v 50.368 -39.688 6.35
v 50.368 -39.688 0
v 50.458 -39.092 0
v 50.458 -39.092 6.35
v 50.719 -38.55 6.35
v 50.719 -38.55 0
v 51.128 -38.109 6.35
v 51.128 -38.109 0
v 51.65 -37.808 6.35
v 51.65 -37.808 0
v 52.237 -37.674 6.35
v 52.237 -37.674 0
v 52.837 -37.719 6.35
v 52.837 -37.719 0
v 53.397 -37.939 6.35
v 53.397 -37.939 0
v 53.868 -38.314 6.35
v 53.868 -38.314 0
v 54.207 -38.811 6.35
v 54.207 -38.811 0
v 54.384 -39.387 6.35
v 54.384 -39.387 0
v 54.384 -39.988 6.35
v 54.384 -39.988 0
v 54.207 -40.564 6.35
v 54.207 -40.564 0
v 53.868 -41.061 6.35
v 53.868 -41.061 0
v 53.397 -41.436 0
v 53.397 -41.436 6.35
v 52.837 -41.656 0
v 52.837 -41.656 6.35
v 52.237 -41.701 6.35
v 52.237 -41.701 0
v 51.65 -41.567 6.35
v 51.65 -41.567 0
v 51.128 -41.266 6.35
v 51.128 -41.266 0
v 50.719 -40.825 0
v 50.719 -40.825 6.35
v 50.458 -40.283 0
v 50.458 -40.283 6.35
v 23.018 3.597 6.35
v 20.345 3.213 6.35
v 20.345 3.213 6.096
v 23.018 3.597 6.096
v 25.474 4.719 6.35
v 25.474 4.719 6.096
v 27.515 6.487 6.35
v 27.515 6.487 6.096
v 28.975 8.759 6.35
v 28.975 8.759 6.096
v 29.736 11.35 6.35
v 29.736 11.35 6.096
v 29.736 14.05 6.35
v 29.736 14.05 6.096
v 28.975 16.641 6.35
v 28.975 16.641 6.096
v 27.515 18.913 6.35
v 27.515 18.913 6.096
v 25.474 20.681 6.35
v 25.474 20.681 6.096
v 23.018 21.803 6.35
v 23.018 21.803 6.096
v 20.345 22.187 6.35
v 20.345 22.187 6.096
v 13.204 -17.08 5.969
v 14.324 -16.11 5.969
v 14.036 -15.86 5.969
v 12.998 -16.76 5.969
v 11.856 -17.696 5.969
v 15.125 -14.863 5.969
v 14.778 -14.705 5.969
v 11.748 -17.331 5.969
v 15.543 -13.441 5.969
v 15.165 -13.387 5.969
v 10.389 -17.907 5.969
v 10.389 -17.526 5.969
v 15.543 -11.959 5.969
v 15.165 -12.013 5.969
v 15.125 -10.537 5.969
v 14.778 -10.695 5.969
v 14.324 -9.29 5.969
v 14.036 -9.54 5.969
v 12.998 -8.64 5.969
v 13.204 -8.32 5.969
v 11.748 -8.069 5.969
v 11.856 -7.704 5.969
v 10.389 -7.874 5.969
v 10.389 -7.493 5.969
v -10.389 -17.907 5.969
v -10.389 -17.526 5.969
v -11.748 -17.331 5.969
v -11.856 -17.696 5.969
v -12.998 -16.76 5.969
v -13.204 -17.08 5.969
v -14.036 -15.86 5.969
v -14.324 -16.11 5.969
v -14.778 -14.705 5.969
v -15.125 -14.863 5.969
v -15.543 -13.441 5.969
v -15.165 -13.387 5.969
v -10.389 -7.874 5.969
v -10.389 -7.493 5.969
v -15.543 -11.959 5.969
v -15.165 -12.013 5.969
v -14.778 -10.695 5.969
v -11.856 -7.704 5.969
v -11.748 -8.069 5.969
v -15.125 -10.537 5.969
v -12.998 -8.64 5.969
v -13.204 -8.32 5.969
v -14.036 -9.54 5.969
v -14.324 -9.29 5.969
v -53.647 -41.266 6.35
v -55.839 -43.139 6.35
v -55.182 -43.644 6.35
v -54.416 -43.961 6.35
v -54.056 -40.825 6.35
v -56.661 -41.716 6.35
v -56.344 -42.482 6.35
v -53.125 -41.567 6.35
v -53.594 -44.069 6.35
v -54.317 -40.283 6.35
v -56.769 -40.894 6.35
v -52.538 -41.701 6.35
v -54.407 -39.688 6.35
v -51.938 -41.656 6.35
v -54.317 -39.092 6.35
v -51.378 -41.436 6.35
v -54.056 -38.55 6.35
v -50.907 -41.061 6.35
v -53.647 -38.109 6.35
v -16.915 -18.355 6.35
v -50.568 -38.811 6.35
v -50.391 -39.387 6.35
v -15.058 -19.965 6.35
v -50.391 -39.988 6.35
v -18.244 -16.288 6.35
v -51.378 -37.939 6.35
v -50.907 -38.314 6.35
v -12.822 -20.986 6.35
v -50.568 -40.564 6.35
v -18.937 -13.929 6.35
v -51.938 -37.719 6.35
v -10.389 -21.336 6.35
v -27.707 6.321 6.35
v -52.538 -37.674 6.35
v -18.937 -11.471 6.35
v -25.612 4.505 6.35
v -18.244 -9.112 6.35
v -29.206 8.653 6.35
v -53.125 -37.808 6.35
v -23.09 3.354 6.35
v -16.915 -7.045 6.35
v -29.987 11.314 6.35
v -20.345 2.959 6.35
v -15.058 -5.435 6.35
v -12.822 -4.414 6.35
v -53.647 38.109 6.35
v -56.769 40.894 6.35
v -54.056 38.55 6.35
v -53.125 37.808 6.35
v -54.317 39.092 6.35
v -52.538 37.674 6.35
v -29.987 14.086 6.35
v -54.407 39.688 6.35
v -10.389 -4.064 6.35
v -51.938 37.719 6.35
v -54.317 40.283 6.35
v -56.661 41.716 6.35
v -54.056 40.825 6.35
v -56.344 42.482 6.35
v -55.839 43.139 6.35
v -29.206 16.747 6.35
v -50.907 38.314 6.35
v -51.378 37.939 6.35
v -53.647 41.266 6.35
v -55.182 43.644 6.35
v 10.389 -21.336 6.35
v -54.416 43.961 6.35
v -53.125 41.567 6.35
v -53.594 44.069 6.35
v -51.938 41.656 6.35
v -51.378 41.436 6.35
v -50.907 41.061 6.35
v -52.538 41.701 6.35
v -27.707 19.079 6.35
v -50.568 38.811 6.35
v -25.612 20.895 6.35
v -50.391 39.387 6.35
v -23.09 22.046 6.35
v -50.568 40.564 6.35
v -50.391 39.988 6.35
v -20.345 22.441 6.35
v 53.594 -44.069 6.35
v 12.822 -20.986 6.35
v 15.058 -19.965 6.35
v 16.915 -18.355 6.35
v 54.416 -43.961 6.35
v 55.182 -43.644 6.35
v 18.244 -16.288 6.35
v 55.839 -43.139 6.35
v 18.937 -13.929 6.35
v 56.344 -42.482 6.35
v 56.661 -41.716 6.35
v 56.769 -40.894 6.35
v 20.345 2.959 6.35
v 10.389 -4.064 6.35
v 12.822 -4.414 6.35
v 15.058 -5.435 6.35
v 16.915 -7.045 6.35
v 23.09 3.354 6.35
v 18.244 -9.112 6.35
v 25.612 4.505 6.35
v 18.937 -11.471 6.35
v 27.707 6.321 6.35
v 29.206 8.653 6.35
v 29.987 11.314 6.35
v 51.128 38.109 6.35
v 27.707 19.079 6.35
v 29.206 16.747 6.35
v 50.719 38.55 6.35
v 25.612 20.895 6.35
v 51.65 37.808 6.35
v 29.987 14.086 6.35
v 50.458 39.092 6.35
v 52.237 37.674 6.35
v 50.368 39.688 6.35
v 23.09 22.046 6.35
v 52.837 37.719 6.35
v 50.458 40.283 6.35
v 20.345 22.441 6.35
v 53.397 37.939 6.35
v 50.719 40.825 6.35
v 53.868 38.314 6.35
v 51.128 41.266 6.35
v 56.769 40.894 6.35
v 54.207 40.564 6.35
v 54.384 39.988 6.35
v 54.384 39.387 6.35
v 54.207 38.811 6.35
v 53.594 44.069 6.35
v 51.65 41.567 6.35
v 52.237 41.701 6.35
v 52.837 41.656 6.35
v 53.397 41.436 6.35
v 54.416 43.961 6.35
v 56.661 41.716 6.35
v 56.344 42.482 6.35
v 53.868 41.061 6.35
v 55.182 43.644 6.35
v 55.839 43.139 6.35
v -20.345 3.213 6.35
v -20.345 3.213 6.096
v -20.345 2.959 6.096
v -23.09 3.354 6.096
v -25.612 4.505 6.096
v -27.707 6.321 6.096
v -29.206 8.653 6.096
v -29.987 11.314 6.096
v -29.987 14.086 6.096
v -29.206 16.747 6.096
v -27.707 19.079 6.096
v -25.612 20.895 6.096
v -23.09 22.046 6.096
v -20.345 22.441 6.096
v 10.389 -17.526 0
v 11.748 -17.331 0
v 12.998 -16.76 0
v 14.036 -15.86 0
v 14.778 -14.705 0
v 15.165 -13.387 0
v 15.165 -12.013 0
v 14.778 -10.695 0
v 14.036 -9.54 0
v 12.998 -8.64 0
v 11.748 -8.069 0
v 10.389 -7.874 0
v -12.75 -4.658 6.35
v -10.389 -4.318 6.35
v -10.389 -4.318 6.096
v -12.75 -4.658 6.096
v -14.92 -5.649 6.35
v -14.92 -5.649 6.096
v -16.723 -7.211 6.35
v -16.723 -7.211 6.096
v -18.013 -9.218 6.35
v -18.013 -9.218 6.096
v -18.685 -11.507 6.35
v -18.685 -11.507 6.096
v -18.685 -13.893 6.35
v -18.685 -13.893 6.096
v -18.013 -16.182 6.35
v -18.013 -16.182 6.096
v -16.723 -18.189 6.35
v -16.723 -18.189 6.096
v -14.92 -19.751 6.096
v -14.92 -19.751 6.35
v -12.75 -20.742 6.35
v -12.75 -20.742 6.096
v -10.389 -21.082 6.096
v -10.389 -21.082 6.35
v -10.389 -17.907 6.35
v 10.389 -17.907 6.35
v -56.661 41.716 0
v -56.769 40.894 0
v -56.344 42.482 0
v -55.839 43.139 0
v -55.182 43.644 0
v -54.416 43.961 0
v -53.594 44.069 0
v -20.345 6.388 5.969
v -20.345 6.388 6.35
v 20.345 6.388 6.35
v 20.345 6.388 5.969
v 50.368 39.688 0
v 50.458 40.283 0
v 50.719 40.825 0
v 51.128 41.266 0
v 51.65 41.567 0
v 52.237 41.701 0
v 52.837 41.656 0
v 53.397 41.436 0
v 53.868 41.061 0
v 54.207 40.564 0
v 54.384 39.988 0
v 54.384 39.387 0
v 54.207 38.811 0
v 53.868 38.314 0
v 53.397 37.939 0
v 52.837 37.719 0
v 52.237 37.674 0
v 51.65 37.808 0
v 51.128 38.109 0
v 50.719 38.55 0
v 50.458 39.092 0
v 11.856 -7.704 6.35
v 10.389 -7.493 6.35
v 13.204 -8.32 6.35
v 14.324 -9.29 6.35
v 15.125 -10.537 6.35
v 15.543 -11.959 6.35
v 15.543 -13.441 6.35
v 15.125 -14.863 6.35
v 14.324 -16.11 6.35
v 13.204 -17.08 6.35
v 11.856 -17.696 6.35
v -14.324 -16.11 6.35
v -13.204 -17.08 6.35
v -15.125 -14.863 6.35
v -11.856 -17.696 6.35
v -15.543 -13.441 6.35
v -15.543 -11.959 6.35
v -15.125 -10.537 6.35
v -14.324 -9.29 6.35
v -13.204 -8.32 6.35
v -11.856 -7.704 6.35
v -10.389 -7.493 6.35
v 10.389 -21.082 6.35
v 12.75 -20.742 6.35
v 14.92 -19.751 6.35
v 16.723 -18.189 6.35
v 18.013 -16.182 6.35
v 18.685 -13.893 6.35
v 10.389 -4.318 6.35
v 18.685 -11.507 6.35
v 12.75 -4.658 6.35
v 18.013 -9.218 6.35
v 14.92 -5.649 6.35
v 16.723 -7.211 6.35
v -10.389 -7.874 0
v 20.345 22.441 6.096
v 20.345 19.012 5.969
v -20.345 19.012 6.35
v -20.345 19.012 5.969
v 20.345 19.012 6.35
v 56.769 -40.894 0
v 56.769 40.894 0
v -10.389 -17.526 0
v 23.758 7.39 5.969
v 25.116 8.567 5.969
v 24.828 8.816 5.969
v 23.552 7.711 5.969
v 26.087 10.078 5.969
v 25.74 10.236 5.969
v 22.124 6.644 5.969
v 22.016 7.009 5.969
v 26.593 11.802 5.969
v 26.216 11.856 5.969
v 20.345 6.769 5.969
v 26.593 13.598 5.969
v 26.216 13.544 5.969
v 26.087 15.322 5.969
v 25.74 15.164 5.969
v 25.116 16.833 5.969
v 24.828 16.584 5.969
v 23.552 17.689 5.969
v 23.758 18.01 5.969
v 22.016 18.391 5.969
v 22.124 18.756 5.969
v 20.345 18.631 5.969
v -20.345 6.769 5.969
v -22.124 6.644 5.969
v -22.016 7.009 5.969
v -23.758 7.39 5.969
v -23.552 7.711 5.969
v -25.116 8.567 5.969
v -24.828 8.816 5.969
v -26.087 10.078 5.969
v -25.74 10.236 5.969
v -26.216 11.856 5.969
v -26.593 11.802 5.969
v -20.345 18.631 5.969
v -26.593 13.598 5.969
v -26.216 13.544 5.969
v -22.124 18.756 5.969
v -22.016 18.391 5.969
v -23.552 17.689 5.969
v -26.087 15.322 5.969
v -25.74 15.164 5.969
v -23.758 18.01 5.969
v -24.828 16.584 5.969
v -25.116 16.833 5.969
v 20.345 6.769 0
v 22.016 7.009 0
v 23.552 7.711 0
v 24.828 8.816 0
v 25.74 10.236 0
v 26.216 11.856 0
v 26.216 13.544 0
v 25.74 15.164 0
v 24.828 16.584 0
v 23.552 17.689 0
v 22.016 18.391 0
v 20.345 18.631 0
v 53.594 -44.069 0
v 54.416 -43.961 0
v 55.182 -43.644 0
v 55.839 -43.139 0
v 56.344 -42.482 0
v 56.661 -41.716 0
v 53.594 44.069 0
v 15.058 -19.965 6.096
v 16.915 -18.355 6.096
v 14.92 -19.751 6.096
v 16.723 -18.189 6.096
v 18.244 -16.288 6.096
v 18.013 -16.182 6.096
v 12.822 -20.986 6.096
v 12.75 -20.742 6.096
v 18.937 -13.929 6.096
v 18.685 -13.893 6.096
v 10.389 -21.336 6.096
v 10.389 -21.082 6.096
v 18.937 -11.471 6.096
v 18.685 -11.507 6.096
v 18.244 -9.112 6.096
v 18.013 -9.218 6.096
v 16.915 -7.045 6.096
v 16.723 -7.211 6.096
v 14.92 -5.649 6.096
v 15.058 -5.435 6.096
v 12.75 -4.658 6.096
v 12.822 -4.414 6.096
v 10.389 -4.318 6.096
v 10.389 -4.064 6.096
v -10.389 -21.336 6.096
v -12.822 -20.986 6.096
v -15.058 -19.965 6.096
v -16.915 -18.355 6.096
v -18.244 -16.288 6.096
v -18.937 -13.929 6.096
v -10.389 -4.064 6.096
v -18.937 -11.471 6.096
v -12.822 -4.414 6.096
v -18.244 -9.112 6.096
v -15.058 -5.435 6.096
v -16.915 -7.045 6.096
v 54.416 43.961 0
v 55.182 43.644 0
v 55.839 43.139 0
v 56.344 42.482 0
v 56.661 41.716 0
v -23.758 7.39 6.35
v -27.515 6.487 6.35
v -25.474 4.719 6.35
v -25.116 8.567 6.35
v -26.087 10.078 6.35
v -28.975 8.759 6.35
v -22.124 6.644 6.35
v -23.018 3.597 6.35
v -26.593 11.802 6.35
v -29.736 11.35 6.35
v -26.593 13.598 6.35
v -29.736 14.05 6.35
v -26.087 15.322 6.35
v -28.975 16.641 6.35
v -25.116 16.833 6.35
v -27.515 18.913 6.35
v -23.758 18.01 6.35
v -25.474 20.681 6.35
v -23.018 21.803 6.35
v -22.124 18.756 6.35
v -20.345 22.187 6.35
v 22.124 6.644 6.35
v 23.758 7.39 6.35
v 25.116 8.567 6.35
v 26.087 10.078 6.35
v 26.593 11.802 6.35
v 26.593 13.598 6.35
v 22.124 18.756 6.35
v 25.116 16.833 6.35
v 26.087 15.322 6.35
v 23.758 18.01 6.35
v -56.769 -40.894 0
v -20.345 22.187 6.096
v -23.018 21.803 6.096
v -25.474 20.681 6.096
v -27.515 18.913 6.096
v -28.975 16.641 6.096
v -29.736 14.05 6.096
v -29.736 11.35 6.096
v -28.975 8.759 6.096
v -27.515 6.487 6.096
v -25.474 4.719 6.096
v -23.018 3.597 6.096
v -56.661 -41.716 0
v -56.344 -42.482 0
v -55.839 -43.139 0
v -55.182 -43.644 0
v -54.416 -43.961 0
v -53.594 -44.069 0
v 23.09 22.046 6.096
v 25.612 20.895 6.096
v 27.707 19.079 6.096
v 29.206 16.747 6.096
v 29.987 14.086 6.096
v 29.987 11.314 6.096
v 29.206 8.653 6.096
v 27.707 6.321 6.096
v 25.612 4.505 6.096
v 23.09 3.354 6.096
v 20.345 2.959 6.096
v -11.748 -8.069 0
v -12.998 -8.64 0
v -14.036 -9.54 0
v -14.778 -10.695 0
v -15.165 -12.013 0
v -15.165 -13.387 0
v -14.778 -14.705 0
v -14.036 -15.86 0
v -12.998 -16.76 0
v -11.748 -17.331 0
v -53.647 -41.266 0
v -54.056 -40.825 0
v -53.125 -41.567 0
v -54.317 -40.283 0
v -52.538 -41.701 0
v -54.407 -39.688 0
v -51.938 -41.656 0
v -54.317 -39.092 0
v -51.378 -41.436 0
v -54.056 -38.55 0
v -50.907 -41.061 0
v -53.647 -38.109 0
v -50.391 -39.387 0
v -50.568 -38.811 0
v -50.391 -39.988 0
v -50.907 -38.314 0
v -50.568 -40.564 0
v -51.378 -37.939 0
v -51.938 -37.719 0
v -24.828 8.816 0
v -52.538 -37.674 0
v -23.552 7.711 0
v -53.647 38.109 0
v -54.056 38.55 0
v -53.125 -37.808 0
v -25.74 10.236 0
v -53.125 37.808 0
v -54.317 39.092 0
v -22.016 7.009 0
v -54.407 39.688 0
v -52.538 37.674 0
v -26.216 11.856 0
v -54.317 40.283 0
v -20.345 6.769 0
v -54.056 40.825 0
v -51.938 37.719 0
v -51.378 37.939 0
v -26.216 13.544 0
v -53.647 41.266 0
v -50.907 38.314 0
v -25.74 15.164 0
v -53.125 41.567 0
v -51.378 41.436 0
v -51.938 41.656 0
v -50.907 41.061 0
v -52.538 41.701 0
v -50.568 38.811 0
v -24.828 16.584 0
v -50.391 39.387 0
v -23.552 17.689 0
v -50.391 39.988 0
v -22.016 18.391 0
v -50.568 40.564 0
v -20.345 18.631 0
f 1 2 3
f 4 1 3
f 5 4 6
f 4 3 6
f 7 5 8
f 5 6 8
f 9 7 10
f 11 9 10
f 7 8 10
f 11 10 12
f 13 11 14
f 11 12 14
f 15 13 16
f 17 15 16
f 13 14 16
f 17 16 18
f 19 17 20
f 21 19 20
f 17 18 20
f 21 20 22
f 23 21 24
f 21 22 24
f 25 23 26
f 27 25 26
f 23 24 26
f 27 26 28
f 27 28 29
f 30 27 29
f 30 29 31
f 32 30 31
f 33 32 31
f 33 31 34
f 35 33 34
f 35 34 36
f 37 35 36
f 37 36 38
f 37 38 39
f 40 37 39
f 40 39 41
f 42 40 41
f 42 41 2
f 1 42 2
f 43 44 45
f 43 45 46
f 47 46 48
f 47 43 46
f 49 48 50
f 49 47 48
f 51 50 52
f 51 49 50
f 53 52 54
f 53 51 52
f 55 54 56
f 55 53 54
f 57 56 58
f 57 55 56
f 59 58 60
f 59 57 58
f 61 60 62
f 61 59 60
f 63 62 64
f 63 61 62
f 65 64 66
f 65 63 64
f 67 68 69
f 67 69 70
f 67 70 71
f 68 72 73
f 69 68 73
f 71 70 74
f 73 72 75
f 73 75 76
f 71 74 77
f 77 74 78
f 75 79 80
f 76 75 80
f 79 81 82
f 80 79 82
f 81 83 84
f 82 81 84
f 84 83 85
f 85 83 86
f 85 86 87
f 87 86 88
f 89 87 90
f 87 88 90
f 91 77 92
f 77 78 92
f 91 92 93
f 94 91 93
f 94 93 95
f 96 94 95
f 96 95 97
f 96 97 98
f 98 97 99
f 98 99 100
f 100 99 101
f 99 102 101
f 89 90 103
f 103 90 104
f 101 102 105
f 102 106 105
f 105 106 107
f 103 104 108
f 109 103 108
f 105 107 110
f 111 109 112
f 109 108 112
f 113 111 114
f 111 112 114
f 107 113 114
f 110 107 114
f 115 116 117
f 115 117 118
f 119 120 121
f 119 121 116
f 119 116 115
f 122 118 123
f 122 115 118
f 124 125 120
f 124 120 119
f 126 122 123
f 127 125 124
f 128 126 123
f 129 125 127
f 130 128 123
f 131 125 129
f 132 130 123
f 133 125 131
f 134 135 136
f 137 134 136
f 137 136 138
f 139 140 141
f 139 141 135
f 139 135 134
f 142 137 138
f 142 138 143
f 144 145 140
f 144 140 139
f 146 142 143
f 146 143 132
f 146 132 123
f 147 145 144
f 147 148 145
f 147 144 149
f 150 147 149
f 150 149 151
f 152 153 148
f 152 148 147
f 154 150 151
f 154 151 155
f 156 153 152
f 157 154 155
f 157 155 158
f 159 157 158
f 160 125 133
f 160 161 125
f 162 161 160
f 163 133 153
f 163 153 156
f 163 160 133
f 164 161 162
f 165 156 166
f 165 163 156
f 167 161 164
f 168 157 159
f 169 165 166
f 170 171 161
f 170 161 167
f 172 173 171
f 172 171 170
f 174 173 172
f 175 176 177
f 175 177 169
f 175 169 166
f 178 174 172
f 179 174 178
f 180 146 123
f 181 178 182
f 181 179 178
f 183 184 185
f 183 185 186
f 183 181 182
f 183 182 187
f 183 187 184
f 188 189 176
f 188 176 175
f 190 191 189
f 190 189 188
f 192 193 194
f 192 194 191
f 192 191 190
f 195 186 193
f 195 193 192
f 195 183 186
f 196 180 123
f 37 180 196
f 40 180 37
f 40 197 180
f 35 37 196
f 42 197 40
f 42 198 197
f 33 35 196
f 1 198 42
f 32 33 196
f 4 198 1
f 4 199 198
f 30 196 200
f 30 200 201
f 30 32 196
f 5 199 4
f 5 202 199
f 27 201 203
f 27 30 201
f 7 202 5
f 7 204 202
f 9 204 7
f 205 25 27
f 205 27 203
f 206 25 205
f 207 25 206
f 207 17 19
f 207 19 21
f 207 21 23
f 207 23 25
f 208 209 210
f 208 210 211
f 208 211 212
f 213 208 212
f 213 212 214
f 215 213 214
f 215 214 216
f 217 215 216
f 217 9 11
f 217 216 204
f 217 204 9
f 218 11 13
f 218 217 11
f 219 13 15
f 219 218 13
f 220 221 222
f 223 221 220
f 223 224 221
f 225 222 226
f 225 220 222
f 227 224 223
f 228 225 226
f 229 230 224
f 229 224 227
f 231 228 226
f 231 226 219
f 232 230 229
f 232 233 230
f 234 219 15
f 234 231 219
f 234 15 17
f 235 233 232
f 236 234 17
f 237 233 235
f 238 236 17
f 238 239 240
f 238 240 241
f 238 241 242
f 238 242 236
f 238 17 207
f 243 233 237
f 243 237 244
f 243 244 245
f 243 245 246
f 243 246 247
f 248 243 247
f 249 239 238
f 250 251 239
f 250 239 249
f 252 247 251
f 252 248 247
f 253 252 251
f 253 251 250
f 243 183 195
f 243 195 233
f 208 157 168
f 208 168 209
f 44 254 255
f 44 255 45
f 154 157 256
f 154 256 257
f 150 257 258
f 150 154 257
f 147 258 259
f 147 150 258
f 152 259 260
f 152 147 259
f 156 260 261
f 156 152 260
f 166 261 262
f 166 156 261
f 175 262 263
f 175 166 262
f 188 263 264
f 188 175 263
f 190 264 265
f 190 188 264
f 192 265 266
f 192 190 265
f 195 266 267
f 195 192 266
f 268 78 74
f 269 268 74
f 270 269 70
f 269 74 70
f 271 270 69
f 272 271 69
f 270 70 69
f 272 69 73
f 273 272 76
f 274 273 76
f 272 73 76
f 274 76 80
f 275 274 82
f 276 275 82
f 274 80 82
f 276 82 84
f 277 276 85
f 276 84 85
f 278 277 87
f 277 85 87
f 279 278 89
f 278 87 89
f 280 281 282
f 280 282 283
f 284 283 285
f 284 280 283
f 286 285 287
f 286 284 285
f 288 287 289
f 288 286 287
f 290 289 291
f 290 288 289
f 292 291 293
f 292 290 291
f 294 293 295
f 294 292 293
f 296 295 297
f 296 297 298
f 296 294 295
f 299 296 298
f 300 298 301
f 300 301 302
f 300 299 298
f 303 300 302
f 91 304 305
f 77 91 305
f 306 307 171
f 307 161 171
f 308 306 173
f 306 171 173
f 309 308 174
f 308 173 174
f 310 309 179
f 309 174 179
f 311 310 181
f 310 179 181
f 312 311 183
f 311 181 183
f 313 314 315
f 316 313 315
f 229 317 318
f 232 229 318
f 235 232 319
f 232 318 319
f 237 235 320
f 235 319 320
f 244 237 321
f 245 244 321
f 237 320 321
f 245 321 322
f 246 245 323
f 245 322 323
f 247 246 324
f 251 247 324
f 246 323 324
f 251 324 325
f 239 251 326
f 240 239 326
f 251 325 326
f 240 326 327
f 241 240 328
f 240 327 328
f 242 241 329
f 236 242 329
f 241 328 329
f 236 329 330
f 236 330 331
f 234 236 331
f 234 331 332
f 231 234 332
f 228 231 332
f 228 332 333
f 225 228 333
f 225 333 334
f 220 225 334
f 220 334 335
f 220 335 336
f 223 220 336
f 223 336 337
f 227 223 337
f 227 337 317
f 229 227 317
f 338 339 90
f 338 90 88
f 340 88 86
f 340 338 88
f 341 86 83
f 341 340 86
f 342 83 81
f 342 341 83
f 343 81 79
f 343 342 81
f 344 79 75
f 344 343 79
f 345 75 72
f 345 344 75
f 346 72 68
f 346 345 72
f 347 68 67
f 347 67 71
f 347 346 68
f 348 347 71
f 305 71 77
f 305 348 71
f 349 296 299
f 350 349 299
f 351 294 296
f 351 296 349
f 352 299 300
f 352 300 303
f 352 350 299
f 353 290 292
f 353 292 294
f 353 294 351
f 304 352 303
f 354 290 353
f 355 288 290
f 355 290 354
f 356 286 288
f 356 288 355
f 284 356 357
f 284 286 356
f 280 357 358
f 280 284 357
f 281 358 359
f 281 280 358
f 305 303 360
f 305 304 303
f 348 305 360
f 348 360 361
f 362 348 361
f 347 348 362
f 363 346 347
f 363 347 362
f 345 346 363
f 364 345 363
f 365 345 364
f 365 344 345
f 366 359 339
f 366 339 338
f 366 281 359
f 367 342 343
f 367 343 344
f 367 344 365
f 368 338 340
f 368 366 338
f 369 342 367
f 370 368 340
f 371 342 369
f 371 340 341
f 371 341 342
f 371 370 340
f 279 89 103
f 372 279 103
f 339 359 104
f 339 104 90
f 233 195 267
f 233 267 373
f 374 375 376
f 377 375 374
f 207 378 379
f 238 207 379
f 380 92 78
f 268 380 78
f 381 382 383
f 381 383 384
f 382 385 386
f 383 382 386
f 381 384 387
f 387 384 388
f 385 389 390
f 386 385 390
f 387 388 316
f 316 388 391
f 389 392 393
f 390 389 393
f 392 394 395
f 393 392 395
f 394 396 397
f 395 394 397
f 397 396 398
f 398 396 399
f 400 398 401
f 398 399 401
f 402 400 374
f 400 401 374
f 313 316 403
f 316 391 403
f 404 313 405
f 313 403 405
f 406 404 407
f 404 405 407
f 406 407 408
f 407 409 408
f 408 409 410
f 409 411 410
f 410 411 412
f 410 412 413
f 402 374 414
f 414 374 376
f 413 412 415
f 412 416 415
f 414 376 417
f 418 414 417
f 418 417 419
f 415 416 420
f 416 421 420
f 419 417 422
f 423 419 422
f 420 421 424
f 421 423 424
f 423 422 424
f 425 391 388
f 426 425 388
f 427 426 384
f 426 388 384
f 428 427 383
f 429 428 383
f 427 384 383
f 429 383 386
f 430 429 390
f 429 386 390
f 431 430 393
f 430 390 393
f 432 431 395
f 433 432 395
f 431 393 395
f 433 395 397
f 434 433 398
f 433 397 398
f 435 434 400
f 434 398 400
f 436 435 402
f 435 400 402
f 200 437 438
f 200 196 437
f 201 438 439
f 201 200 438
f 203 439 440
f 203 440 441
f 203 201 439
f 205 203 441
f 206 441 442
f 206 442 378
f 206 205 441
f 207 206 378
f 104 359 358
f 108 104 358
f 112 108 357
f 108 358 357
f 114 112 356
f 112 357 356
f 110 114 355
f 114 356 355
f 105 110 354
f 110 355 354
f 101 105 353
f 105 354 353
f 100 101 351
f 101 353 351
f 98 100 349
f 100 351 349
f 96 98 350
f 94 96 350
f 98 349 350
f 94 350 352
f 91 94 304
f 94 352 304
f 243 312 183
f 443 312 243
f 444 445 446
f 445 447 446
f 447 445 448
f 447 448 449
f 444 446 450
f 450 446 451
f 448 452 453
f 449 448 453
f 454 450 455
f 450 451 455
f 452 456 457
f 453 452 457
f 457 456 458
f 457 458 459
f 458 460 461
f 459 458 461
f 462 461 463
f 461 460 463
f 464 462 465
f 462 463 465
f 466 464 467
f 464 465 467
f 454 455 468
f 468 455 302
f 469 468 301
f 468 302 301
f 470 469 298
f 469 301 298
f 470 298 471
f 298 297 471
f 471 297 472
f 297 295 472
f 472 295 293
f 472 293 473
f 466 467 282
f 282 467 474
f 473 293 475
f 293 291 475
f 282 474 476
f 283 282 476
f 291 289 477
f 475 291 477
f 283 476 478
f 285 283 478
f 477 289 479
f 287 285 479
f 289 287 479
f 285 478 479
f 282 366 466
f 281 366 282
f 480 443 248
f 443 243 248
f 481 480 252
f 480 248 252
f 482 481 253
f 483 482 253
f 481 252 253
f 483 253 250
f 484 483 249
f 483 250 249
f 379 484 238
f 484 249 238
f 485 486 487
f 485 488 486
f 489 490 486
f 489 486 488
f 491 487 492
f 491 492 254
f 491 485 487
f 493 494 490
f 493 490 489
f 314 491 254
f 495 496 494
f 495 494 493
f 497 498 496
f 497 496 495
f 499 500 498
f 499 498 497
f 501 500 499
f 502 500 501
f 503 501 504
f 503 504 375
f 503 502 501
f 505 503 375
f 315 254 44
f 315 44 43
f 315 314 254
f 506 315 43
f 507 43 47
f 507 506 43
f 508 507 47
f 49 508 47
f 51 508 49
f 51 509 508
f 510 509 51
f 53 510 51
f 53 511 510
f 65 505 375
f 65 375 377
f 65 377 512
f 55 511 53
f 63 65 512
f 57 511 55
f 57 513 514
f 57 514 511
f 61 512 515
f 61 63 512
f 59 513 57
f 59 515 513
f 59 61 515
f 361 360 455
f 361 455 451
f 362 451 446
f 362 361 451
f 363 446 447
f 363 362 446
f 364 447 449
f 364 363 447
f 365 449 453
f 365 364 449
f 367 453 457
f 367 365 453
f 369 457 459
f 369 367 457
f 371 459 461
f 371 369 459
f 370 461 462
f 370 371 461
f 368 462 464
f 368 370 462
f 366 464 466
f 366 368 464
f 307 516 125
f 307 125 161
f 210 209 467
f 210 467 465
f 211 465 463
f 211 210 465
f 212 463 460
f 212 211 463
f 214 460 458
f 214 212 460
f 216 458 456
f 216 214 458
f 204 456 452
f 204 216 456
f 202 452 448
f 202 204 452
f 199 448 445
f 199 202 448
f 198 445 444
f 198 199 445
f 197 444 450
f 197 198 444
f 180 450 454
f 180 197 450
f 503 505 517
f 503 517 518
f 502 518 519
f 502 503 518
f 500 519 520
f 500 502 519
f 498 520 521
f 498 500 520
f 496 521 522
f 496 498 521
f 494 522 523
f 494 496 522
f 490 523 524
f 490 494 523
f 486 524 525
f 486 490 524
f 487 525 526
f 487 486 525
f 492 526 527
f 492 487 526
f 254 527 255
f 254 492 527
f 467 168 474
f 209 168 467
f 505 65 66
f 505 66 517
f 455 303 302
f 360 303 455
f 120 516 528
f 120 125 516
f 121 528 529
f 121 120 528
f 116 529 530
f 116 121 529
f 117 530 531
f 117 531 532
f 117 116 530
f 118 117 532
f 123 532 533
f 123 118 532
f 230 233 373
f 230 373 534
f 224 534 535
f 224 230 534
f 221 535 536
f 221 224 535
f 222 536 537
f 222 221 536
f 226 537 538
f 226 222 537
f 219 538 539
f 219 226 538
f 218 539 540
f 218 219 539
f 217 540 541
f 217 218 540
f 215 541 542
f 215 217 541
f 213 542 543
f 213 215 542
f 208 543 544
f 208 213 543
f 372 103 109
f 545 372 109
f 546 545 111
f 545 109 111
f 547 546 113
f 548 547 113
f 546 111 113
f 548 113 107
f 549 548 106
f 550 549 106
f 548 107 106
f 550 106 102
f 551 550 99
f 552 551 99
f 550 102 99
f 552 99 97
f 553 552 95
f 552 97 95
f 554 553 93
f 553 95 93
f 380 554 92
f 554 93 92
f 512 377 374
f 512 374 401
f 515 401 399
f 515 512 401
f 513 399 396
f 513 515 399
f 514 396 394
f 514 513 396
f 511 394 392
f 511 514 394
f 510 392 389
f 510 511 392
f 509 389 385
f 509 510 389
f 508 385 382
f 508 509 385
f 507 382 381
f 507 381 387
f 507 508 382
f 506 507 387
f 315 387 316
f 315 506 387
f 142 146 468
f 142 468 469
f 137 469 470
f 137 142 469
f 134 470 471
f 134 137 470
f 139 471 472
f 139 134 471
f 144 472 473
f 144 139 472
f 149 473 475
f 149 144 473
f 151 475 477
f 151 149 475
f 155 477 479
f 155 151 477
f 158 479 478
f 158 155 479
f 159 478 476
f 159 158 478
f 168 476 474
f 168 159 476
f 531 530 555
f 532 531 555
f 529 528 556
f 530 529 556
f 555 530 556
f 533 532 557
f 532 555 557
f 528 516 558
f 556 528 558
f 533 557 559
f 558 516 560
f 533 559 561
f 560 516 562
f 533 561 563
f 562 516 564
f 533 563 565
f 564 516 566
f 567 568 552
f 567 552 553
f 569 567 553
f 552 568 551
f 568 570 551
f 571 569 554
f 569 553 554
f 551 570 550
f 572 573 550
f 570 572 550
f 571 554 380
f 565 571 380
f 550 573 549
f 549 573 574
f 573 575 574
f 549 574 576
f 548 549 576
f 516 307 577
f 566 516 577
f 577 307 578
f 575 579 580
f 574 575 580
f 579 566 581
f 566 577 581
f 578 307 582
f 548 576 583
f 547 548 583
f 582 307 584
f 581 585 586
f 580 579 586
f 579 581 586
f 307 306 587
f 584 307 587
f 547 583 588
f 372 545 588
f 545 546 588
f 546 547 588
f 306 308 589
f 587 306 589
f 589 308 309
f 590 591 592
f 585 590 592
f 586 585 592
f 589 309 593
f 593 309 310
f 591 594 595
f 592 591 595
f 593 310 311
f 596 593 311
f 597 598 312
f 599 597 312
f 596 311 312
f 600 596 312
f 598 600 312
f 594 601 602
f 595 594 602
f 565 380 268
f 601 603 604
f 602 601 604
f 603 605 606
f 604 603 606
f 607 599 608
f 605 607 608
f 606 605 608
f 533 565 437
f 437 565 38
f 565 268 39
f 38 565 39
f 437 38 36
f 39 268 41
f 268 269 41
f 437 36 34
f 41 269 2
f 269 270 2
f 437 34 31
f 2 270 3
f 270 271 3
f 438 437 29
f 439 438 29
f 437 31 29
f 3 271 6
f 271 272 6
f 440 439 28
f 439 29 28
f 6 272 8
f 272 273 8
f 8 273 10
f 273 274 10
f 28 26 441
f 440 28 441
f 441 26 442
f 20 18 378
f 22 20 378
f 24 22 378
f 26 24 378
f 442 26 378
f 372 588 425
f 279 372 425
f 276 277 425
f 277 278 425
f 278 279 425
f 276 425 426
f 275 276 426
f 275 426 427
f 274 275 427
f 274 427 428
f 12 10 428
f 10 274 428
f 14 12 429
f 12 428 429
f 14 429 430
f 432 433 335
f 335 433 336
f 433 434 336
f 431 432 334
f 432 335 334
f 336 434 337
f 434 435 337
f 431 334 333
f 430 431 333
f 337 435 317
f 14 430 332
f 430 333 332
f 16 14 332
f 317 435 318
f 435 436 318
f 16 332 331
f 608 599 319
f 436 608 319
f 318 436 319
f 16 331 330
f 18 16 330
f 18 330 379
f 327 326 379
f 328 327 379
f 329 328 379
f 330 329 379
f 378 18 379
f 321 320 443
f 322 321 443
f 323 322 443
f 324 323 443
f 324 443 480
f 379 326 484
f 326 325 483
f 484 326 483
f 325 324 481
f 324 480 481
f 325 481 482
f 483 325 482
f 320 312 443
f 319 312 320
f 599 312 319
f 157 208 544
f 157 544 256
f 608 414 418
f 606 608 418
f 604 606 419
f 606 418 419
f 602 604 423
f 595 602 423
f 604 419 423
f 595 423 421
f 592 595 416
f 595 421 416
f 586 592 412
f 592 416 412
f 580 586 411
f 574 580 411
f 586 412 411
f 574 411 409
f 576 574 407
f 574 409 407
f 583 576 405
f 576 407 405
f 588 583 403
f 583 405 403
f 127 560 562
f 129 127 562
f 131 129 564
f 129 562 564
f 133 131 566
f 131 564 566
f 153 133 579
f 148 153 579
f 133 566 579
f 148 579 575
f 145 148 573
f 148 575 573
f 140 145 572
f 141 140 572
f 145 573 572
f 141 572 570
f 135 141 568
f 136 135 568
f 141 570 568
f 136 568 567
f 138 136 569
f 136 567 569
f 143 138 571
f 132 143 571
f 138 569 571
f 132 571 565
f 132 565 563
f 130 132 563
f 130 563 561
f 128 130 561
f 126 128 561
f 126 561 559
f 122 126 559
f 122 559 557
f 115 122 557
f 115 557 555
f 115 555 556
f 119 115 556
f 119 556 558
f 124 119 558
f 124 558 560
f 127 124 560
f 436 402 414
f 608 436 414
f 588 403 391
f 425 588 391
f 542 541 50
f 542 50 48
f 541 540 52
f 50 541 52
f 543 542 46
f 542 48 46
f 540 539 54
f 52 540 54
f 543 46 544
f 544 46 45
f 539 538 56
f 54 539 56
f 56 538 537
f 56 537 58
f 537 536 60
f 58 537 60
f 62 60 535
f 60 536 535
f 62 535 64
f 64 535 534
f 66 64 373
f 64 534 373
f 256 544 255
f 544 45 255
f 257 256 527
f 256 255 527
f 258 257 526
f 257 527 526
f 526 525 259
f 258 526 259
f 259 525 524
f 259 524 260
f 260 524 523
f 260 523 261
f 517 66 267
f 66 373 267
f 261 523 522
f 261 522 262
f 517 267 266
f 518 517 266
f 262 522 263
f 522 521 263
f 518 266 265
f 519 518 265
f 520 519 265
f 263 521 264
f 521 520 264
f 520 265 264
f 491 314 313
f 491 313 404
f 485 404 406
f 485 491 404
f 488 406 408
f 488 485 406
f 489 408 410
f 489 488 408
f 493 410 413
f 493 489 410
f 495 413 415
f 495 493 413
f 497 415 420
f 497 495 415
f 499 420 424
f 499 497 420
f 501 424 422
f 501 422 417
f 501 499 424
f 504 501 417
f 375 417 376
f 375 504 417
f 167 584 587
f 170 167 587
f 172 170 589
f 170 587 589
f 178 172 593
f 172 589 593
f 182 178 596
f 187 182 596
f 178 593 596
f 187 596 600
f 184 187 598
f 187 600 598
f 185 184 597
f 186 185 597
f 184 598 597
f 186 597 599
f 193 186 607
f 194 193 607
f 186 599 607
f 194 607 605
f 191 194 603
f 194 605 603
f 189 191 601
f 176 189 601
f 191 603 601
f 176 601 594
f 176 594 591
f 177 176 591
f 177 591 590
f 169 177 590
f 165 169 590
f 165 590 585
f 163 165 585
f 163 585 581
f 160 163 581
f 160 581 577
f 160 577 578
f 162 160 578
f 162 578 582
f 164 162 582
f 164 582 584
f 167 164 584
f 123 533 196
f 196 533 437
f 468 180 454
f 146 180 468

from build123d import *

# Parameters (mm, degrees)
SKETCH1_W                 = 113.538
SKETCH1_H                 = 88.138
EXTRUDE1_DEPTH            = 6.35
F_8_CLEARANCE_HOLE1_D     = 4.0386
F_8_CLEARANCE_HOLE1_DEPTH = 6.35
FILLET2_R                 = 3.175
SKETCH8_W                 = 40.6908
SKETCH8_H                 = 12.6238
SKETCH8_W_2               = 20.7772
SKETCH8_H_2               = 10.414
CUT_EXTRUDE1_DEPTH        = 0.381
CUT_EXTRUDE2_DEPTH        = 7.35
CUT_EXTRUDE3_DEPTH        = 0.254


with BuildPart() as part:
    # Sketch1 → Extrude1 (new body)
    with BuildSketch(Plane.XY):
        Rectangle(SKETCH1_W, SKETCH1_H)
    extrude(amount=EXTRUDE1_DEPTH)

    # #8 Clearance Hole1
    with Locations(Plane(origin=(-52.3875, 39.6875, 6.35), x_dir=(1, 0, 0), z_dir=(0, 0, 1))):
        with Locations((0, 0), (104.775, 0), (104.775, -79.375), (0, -79.375)):
            Hole(F_8_CLEARANCE_HOLE1_D / 2, depth=F_8_CLEARANCE_HOLE1_DEPTH)

    # Fillet2
    fillet2_edges = [part.edges().sort_by_distance(p)[0] for p in [
        (-56.769, 44.069, 3.175),
        (56.769, 44.069, 3.175),
        (56.769, -44.069, 3.175),
        (-56.769, -44.069, 3.175),
    ]]
    fillet(fillet2_edges, radius=FILLET2_R)

    # Sketch8 → Cut-Extrude1 (cut)
    with BuildSketch(Plane.XY.offset(6.35)):
        with BuildLine():
            ThreePointArc((-20.3454, 6.3881), (-26.6573, 12.7), (-20.3454, 19.0119))
            Line((-20.3454, 19.0119), (-20.3454, 6.3881))
        make_face()
        with Locations((0, 12.7)):
            Rectangle(SKETCH8_W, SKETCH8_H)
        with BuildLine():
            ThreePointArc((20.3454, 19.0119), (26.6573, 12.7), (20.3454, 6.3881))
            Line((20.3454, 6.3881), (20.3454, 19.0119))
        make_face()
        with BuildLine():
            ThreePointArc((10.3886, -7.493), (15.5956, -12.7), (10.3886, -17.907))
            Line((10.3886, -17.907), (10.3886, -7.493))
        make_face()
        with Locations((0, -12.7)):
            Rectangle(SKETCH8_W_2, SKETCH8_H_2)
        with BuildLine():
            Line((-10.3886, -17.907), (-10.3886, -7.493))
            ThreePointArc((-10.3886, -7.493), (-15.5956, -12.7), (-10.3886, -17.907))
        make_face()
    extrude(amount=-CUT_EXTRUDE1_DEPTH, mode=Mode.SUBTRACT)

    # Sketch9 → Cut-Extrude2 (cut, through all)
    with BuildSketch(Plane.XY.offset(6.35)):
        with BuildLine():
            Line((-20.3454, 6.7691), (20.3454, 6.7691))
            ThreePointArc((20.3454, 6.7691), (26.2763, 12.7), (20.3454, 18.6309))
            Line((20.3454, 18.6309), (-20.3454, 18.6309))
            ThreePointArc((-20.3454, 18.6309), (-26.2763, 12.7), (-20.3454, 6.7691))
        make_face()
        with BuildLine():
            Line((10.3886, -7.874), (-10.3886, -7.874))
            ThreePointArc((-10.3886, -7.874), (-15.2146, -12.7), (-10.3886, -17.526))
            Line((-10.3886, -17.526), (10.3886, -17.526))
            ThreePointArc((10.3886, -17.526), (15.2146, -12.7), (10.3886, -7.874))
        make_face()
    extrude(amount=-CUT_EXTRUDE2_DEPTH, mode=Mode.SUBTRACT)

    # Sketch10 → Cut-Extrude3 (cut)
    with BuildSketch(Plane.XY.offset(6.35)):
        with BuildLine():
            Line((20.3454, 2.9591), (-20.3454, 2.9591))
            ThreePointArc((-20.3454, 2.9591), (-30.0863, 12.7), (-20.3454, 22.4409))
            Line((-20.3454, 22.4409), (20.3454, 22.4409))
            ThreePointArc((20.3454, 22.4409), (30.0863, 12.7), (20.3454, 2.9591))
        make_face()
        with BuildLine():
            ThreePointArc((20.3454, 3.2131), (29.8323, 12.7), (20.3454, 22.1869))
            Line((20.3454, 22.1869), (-20.3454, 22.1869))
            ThreePointArc((-20.3454, 22.1869), (-29.8323, 12.7), (-20.3454, 3.2131))
            Line((-20.3454, 3.2131), (20.3454, 3.2131))
        make_face(mode=Mode.SUBTRACT)
        with BuildLine():
            Line((10.3886, -21.336), (-10.3886, -21.336))
            ThreePointArc((-10.3886, -21.336), (-19.0246, -12.7), (-10.3886, -4.064))
            Line((-10.3886, -4.064), (10.3886, -4.064))
            ThreePointArc((10.3886, -4.064), (19.0246, -12.7), (10.3886, -21.336))
        make_face()
        with BuildLine():
            ThreePointArc((10.3886, -21.082), (18.7706, -12.7), (10.3886, -4.318))
            Line((10.3886, -4.318), (-10.3886, -4.318))
            ThreePointArc((-10.3886, -4.318), (-18.7706, -12.7), (-10.3886, -21.082))
            Line((-10.3886, -21.082), (10.3886, -21.082))
        make_face(mode=Mode.SUBTRACT)
    extrude(amount=-CUT_EXTRUDE3_DEPTH, mode=Mode.SUBTRACT)


solid = part.part
